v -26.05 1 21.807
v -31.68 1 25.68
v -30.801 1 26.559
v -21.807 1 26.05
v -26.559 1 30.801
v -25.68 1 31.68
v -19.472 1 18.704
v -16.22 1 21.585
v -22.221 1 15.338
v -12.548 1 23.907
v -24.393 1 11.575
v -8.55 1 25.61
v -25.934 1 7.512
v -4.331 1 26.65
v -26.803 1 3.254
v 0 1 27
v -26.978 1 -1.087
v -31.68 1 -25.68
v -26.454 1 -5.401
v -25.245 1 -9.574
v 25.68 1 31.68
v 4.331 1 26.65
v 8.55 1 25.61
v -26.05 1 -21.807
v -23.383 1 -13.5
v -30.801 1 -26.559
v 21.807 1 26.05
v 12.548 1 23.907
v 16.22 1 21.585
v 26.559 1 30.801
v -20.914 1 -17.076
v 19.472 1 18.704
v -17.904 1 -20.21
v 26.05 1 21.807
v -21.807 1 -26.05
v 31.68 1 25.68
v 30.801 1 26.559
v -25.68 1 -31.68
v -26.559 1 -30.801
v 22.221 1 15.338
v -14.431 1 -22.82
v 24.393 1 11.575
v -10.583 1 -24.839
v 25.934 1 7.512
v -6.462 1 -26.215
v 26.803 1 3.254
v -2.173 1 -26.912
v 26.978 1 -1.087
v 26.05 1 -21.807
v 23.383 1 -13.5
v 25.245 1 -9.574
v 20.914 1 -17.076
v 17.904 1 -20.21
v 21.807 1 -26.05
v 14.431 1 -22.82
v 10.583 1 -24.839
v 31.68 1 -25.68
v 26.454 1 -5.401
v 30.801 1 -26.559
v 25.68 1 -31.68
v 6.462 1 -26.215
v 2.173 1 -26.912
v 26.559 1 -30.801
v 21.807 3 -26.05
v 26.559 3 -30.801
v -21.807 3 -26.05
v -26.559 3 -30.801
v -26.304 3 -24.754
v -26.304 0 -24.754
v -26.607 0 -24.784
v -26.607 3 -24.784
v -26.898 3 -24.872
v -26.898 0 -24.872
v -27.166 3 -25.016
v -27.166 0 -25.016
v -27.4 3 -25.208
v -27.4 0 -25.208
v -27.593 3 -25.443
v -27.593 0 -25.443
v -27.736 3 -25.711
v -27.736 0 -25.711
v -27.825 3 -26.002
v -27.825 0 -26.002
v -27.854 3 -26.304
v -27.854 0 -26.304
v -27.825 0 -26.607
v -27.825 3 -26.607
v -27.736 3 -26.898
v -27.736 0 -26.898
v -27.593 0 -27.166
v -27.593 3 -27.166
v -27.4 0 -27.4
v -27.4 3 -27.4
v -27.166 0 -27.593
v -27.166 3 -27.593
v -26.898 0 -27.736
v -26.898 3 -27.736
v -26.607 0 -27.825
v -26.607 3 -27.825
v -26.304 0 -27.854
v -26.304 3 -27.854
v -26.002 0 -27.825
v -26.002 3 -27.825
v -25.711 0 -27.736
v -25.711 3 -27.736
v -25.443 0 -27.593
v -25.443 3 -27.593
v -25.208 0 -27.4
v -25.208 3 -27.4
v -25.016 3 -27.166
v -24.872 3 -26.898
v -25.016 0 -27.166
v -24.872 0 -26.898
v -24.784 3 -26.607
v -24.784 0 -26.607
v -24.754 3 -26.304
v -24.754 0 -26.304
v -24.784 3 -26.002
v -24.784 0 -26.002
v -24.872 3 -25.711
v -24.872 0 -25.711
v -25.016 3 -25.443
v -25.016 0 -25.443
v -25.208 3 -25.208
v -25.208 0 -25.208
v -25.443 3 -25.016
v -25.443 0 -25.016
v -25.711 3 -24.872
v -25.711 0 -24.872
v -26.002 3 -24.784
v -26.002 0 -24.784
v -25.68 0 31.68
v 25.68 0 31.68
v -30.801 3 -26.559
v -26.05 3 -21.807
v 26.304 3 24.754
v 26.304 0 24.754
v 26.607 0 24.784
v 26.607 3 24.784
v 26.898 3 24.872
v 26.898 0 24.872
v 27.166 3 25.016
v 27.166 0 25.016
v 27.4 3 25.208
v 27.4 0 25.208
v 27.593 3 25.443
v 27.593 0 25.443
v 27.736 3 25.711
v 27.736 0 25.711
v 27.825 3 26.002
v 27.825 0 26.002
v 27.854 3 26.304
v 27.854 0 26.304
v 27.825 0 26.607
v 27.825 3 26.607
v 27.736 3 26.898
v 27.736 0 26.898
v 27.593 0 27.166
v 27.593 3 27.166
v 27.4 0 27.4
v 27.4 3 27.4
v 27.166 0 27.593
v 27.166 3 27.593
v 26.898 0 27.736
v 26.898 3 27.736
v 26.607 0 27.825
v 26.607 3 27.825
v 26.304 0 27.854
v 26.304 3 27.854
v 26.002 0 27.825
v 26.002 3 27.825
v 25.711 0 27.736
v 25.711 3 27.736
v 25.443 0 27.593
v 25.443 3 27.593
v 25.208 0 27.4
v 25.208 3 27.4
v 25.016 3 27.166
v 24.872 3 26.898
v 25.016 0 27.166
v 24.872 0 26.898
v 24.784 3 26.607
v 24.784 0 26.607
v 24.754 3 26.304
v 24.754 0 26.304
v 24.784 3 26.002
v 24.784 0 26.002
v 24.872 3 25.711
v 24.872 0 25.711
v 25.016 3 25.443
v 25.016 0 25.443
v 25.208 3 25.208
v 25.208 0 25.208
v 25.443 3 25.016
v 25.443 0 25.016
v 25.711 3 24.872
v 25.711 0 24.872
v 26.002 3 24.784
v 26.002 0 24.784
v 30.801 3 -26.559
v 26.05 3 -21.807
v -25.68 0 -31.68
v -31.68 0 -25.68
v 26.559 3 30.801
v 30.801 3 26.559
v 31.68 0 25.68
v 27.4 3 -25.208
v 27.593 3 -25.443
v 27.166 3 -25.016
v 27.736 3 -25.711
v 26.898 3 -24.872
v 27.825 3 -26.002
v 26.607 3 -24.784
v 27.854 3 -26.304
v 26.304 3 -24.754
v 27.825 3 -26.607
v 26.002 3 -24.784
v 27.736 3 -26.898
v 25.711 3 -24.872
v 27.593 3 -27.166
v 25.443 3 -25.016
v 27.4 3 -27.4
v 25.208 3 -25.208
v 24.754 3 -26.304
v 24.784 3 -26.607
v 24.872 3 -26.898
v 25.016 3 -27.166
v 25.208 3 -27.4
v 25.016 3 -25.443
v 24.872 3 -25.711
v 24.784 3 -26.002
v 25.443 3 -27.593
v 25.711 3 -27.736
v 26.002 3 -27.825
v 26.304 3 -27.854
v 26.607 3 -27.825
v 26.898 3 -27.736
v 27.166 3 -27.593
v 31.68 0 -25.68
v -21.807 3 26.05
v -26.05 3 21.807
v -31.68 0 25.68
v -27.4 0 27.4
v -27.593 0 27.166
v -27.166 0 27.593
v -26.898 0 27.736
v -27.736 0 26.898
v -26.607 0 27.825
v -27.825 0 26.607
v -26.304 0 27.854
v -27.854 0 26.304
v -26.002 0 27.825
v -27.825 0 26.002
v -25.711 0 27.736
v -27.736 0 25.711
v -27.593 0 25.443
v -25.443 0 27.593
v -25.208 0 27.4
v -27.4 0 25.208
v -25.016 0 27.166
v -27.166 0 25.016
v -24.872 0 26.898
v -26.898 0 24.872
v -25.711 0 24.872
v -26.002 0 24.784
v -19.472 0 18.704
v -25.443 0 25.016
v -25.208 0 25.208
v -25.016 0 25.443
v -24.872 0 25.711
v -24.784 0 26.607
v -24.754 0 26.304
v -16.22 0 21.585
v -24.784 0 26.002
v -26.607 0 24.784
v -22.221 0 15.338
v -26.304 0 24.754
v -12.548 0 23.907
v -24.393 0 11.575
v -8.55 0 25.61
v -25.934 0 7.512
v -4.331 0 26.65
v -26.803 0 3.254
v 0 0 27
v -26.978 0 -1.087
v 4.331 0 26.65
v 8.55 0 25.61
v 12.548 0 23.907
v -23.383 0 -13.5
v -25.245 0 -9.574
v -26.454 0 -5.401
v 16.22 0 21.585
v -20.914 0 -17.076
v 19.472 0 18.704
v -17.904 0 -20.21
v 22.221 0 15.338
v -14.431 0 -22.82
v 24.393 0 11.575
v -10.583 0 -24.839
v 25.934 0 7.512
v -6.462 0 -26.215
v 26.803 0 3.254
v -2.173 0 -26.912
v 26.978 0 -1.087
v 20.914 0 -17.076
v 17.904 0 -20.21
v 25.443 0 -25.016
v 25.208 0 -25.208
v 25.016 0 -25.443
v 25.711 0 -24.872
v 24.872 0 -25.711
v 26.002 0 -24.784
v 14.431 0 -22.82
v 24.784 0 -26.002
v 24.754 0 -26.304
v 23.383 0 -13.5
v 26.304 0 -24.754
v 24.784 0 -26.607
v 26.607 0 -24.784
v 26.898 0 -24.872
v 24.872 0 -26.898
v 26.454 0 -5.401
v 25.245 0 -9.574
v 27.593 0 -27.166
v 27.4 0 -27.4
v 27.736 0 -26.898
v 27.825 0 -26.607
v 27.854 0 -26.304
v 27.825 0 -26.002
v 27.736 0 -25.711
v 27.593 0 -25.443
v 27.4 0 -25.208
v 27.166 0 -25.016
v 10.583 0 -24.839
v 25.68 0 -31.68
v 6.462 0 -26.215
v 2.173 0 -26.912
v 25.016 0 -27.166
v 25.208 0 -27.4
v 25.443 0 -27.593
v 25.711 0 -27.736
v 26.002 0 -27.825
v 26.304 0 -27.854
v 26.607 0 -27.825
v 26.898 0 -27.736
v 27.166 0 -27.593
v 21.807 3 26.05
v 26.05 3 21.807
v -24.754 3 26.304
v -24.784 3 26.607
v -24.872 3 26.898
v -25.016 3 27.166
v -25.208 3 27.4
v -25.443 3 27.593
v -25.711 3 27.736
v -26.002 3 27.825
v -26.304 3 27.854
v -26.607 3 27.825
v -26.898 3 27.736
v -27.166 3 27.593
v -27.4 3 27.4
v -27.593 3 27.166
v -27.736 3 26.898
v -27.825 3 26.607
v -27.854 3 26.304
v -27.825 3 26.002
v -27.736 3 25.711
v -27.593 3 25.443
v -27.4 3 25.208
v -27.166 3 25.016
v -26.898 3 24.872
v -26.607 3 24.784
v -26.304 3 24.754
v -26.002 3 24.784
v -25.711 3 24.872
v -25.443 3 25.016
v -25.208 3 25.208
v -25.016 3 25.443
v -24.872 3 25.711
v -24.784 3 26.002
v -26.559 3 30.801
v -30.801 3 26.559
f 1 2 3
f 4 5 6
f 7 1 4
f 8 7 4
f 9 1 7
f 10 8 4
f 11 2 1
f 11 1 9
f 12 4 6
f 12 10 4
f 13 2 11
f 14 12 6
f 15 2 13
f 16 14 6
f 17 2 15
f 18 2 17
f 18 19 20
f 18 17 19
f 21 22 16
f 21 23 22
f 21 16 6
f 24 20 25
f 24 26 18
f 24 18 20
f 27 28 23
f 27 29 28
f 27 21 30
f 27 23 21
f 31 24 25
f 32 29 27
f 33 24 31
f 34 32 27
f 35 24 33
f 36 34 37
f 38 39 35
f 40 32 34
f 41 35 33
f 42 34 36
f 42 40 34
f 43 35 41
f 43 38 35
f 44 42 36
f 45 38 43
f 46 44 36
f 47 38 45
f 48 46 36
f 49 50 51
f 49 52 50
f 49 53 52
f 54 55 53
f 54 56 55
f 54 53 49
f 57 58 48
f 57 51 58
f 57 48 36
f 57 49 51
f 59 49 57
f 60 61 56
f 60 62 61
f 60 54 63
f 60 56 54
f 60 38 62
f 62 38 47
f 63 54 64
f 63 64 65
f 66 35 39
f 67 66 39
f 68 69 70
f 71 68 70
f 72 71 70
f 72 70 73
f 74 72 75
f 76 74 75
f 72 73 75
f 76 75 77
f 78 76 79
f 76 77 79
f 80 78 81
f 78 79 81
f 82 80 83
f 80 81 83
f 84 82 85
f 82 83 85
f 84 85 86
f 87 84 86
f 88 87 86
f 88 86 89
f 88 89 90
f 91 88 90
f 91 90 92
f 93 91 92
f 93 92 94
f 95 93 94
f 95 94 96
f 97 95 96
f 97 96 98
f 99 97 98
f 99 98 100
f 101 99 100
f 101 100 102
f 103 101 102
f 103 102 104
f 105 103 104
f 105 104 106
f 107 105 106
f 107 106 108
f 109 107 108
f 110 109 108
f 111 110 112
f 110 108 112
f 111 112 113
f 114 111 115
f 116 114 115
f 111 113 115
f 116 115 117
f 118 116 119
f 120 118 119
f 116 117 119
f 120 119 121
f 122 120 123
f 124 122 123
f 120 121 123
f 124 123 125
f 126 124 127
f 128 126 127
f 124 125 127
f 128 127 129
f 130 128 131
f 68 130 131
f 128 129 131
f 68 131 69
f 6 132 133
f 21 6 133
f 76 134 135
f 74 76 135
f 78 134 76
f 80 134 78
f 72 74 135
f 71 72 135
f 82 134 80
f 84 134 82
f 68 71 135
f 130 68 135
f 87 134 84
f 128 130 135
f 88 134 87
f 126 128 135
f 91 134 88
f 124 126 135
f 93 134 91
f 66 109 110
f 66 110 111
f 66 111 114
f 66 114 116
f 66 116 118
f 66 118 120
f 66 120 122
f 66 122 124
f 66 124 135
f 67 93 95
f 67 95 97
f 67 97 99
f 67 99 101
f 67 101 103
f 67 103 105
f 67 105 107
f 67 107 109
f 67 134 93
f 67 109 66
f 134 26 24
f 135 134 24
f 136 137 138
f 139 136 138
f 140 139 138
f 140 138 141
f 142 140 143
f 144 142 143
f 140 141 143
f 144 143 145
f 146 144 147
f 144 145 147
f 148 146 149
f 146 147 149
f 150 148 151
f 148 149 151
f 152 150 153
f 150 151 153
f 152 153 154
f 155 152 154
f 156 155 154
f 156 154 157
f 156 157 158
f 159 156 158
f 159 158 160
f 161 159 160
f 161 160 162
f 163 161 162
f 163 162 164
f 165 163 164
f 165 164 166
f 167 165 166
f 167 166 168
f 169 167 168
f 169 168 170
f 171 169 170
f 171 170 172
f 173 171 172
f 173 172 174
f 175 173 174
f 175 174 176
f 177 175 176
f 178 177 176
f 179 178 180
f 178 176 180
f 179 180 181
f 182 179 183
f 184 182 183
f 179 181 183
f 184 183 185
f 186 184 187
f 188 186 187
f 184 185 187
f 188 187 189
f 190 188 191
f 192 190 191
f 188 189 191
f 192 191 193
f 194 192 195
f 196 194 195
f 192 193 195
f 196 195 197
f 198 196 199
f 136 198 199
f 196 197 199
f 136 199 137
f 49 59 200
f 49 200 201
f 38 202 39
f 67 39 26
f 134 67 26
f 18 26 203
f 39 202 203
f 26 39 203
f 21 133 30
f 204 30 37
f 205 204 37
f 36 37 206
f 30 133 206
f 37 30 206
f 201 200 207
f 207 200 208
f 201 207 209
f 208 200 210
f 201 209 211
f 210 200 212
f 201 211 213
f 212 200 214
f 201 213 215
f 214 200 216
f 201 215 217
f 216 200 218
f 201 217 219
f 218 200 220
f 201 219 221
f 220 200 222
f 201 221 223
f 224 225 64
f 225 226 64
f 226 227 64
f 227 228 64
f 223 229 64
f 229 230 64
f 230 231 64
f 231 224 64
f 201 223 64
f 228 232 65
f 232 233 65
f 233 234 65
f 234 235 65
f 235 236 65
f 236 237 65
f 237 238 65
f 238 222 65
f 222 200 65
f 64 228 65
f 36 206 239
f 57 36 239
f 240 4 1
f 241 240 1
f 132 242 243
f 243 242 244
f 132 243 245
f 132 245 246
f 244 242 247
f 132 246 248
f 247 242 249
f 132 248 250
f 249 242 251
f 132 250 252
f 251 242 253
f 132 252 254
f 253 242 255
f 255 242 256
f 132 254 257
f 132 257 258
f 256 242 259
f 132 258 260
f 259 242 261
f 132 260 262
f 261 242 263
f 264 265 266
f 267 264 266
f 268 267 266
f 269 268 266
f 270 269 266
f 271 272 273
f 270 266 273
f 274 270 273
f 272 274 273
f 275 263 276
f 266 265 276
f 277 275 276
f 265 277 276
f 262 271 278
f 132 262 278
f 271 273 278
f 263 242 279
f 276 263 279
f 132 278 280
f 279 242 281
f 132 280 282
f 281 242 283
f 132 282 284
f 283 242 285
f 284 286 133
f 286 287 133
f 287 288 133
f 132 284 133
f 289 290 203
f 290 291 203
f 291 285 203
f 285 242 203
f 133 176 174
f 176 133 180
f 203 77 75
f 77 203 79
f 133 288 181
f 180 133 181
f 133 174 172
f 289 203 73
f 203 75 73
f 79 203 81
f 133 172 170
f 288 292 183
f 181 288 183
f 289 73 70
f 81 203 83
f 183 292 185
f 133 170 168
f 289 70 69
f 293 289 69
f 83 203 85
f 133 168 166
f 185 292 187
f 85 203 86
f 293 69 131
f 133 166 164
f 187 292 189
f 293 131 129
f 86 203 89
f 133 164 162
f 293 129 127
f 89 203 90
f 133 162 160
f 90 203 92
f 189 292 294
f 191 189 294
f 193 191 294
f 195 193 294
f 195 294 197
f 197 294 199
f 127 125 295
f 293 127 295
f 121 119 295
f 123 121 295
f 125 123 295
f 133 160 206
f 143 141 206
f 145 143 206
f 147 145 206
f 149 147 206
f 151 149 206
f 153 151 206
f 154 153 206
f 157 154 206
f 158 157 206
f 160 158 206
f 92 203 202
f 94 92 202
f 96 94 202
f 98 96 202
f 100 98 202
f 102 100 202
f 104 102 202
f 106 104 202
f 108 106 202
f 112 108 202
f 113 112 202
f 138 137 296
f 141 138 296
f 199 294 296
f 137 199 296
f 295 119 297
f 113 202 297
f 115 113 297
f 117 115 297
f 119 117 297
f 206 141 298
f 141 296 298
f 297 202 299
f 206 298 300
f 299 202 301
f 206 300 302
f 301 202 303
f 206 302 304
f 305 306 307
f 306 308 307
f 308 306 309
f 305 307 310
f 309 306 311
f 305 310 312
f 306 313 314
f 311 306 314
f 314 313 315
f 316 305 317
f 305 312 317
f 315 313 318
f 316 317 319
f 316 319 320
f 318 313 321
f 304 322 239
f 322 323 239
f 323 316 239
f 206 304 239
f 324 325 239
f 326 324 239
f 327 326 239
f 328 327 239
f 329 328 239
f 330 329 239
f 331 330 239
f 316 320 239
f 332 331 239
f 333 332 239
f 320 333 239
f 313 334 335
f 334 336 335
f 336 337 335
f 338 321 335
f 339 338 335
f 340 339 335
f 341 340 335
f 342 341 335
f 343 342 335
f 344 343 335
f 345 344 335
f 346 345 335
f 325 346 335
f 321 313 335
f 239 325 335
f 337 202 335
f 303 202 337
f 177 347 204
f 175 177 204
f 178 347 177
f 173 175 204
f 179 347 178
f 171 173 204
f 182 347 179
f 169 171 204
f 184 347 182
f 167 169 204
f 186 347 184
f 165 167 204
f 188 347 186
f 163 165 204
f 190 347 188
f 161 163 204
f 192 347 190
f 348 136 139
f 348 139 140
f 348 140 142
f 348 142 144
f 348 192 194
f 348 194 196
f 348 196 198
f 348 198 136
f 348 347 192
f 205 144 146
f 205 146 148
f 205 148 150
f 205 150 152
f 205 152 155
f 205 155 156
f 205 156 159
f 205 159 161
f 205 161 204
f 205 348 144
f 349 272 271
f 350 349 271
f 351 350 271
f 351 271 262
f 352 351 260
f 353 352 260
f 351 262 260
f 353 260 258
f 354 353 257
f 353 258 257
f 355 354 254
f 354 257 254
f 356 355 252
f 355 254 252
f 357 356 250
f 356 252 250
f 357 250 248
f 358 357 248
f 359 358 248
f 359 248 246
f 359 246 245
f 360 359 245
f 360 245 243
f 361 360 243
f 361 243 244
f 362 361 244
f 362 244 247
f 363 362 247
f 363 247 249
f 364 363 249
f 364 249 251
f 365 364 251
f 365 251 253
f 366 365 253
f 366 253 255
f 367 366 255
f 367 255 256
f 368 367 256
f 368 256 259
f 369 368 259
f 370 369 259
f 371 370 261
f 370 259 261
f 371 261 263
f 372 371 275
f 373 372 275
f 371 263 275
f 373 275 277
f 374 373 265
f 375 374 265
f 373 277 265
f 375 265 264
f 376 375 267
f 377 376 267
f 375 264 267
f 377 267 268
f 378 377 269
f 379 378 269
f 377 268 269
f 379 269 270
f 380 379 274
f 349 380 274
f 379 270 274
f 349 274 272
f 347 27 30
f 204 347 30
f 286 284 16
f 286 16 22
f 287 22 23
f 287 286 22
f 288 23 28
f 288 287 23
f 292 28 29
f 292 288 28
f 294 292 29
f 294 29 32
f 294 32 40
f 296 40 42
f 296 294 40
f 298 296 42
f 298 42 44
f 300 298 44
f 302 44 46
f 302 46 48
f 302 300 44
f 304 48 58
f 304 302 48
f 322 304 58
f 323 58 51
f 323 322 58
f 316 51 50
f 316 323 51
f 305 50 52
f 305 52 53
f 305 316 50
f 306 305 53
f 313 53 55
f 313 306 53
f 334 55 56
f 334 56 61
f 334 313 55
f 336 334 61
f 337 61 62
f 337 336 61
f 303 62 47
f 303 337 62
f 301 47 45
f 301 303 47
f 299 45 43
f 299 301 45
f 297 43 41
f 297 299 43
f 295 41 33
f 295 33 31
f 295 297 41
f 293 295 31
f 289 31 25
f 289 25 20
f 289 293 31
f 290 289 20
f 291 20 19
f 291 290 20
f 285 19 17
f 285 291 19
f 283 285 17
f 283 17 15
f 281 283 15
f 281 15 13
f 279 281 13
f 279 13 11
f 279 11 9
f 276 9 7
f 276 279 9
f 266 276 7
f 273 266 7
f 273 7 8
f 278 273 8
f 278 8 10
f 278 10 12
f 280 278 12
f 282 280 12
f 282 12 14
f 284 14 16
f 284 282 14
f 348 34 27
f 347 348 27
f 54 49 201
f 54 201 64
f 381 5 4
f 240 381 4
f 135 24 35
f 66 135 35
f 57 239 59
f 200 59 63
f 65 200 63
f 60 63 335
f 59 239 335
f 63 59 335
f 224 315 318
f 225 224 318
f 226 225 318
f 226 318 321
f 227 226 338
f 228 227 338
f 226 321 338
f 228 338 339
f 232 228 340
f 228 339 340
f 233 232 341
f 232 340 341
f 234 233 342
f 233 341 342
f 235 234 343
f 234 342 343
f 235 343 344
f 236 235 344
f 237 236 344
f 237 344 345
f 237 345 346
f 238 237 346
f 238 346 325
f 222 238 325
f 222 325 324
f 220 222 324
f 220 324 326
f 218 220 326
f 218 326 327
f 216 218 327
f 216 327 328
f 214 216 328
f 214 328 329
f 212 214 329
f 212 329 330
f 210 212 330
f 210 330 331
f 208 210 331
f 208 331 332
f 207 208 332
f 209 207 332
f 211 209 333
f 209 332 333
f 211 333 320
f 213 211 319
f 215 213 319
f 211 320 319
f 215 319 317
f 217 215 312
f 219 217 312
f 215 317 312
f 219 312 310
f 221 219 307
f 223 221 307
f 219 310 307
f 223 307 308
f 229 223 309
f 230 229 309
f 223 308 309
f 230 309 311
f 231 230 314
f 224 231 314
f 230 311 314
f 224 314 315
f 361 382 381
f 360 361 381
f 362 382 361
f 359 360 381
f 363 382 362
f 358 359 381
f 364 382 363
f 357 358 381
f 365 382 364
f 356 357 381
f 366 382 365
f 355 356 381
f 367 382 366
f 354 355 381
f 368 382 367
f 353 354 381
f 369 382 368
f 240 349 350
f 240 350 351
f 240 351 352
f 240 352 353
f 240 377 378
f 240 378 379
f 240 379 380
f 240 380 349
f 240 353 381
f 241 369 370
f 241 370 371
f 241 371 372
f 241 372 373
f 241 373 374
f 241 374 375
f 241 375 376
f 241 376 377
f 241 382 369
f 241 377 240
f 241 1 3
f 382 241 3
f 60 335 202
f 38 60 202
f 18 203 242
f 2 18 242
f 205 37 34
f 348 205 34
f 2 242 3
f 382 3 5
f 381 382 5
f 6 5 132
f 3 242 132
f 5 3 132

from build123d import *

# Parameters (mm, degrees)
SKETCH1_R            = 27
BOSS_EXTRUDE1_DEPTH  = 1
BOSS_EXTRUDE2_DEPTH  = 2
M3_CLEARANCE_HOLE1_D = 3.1
CIRPATTERN1_COUNT    = 4


with BuildPart() as part:
    # Sketch1 → Boss-Extrude1 (new body)
    with BuildSketch(Plane(origin=(0, 0, 0), x_dir=(1, 0, 0), z_dir=(0, 1, 0))):
        Polygon((31.68, 25.68), (25.68, 31.68), (-25.68, 31.68), (-31.68, 25.68), (-31.68, -25.68), (-25.68, -31.68), (25.68, -31.68), (31.68, -25.68), align=None)
        with Locations(Location((0, 0, 0), (0, 0, 270))):
            Circle(SKETCH1_R, mode=Mode.SUBTRACT)
    extrude(amount=BOSS_EXTRUDE1_DEPTH)

    # Sketch2 → Boss-Extrude2 (add)
    with BuildSketch(Plane(origin=(0, 1, 0), x_dir=(1, 0, 0), z_dir=(0, 1, 0))):
        Polygon((30.801320344, 26.558679656), (26.050064864, 21.807424177), (21.807424177, 26.050064864), (26.558679656, 30.801320344), align=None)
        Polygon((30.801320344, -26.558679656), (26.050064864, -21.807424177), (21.807424177, -26.050064864), (26.558679656, -30.801320344), align=None)
        Polygon((-26.558679656, -30.801320344), (-21.807424177, -26.050064864), (-26.050064864, -21.807424177), (-30.801320344, -26.558679656), align=None)
        Polygon((-30.801320344, 26.558679656), (-26.050064864, 21.807424177), (-21.807424177, 26.050064864), (-26.558679656, 30.801320344), align=None)
    extrude(amount=BOSS_EXTRUDE2_DEPTH)

    # M3 Clearance Hole1 (through all)
    with Locations(Plane(origin=(0, 3, 0), x_dir=(1, 0, 0), z_dir=(0, 1, 0))):
        with Locations((26.30437226, 26.30437226)):
            m3_clearance_hole1 = Hole(M3_CLEARANCE_HOLE1_D / 2)

    # CirPattern1: M3 Clearance Hole1 ×4 about axis
    cirpattern1_axis = Axis((0, 0, 0), (0, 1, 0))
    for i in range(1, CIRPATTERN1_COUNT):
        add(m3_clearance_hole1.rotate(cirpattern1_axis, i * 360 / CIRPATTERN1_COUNT), mode=Mode.SUBTRACT)


solid = part.part
